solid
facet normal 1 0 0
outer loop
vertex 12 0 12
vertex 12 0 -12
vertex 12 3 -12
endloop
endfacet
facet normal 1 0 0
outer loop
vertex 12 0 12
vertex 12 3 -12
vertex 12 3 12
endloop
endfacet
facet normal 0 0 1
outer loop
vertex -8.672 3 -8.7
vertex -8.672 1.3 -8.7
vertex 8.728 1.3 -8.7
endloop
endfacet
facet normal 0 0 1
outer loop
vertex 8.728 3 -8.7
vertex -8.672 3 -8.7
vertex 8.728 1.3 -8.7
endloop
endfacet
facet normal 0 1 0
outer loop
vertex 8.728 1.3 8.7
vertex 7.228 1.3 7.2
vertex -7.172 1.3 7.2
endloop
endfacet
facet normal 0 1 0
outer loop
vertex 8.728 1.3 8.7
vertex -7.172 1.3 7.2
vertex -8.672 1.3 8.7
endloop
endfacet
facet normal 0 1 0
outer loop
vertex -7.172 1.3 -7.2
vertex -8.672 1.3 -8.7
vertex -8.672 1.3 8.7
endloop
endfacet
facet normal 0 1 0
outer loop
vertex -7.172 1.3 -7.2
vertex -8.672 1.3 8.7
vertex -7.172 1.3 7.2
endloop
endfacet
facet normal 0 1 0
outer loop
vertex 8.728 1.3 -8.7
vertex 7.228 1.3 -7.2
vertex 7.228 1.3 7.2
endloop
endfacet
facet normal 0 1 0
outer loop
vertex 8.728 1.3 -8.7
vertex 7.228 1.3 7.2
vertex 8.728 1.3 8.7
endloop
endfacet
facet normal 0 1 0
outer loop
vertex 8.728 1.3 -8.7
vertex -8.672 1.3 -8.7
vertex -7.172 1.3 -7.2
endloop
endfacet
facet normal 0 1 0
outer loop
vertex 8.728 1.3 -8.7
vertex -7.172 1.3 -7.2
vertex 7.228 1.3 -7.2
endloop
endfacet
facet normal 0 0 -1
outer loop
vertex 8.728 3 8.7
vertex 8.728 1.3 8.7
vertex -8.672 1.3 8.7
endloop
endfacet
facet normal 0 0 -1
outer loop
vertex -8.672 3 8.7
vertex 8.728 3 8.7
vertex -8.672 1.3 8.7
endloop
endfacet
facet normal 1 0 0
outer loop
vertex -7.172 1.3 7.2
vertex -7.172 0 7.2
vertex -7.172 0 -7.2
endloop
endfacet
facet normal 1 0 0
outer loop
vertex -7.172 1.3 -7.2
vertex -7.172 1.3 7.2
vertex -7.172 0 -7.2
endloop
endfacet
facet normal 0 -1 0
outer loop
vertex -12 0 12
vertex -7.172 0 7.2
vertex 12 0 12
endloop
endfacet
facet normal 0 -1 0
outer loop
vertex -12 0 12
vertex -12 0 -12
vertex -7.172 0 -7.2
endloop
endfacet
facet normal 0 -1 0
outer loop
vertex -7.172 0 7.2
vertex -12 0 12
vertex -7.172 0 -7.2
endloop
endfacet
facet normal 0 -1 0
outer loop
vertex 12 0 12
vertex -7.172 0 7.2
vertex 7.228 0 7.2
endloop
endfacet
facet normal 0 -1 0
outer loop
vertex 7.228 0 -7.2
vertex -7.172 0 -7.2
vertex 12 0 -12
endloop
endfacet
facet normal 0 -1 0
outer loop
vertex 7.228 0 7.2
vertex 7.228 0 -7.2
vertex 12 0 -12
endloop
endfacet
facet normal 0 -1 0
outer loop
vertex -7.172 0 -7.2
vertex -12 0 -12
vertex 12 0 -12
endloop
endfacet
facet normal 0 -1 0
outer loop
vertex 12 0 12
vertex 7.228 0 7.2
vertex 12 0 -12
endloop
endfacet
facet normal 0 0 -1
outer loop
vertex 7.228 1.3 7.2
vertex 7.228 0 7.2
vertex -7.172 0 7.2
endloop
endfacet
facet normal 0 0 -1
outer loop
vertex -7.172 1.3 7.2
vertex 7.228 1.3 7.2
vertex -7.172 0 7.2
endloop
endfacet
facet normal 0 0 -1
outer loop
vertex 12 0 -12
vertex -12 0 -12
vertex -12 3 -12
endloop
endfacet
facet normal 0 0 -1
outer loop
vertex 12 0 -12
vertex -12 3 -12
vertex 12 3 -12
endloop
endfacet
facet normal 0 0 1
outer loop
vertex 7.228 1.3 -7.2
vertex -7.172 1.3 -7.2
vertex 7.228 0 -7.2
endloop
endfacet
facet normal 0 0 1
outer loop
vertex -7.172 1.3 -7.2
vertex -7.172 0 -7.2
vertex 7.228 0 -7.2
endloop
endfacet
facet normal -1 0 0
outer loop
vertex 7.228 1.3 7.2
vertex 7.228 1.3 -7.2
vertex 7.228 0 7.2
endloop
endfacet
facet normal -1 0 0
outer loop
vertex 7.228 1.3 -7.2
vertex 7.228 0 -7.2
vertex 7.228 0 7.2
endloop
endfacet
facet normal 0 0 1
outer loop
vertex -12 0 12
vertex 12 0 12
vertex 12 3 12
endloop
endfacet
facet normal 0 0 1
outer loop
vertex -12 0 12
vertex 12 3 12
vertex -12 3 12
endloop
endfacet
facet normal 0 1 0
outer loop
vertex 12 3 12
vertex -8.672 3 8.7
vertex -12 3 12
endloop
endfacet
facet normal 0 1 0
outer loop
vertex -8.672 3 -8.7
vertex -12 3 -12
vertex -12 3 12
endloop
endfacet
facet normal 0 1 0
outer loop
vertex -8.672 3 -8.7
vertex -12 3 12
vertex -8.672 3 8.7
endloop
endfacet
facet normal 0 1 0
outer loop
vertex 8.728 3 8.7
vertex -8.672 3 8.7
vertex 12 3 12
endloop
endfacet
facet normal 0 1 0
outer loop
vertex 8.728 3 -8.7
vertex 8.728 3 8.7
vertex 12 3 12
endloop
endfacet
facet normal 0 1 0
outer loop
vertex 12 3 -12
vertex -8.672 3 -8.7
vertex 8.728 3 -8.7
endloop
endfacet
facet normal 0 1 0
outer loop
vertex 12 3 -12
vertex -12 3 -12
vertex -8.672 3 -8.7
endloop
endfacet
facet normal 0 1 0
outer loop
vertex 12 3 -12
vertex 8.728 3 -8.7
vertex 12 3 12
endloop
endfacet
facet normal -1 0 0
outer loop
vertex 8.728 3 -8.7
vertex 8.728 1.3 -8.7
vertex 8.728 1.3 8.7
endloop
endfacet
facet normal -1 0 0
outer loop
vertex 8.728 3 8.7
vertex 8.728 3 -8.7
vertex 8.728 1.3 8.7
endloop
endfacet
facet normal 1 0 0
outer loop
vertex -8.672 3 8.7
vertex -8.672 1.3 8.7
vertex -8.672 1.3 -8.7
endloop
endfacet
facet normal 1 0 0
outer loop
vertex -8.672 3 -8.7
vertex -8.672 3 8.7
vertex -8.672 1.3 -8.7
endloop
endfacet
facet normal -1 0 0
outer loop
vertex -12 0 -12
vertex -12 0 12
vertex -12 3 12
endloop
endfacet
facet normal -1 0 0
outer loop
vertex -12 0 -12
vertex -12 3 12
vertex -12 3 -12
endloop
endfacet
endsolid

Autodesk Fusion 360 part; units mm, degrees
sketch "Switch" plane through (0, 0, 0) normal (0, 1, 0) x (1, 0, 0)
  line L0 (-7.1721, 7.2) -> (7.2279, 7.2)
  line L1 (-8.6721, -8.7) -> (-8.6721, 8.7)
  line L2 (7.2279, -7.2) -> (-7.1721, -7.2)
  line L3 (-8.6721, 8.7) -> (8.7279, 8.7)
  line L4 (-8.6721, -8.7) -> (8.7279, 8.7) construction
  line L5 (-7.1721, -7.2) -> (7.2279, 7.2) construction
  line L6 (8.7279, -8.7) -> (-8.6721, -8.7)
  line L7 (-7.1721, -7.2) -> (-7.1721, 7.2)
  line L8 (7.2279, 7.2) -> (7.2279, -7.2)
  line L9 (8.7279, 8.7) -> (8.7279, -8.7)
  line L10 (8.7279, -8.7) -> (-8.6721, 8.7) construction
  line L11 (7.2279, -7.2) -> (-7.1721, 7.2) construction
  line L12 (-12, 12) -> (12, 12)
  line L13 (12, 12) -> (12, -12)
  line L14 (12, -12) -> (-12, -12)
  line L15 (-12, -12) -> (-12, 12)
  line L16 (-12, 12) -> (12, -12) construction
  line L17 (12, 12) -> (-12, -12) construction
  point P0 (0.0279, 0)
  dimension "d1" = 14.4
  dimension "d2" = 14.4
  dimension "d3" = 1.5
  dimension "d4" = 1.5
  dimension "d5" = 1.5
  dimension "d6" = 1.5
  dimension "d7" = 24
  dimension "d8" = 24
extrude "Extrude1" add sketch "Switch" along normal blind 3 contours L12 L13 L14 L15
extrude "Extrude2" add sketch "Switch" along normal blind 1.3 contours L1 L3 L6 L9
